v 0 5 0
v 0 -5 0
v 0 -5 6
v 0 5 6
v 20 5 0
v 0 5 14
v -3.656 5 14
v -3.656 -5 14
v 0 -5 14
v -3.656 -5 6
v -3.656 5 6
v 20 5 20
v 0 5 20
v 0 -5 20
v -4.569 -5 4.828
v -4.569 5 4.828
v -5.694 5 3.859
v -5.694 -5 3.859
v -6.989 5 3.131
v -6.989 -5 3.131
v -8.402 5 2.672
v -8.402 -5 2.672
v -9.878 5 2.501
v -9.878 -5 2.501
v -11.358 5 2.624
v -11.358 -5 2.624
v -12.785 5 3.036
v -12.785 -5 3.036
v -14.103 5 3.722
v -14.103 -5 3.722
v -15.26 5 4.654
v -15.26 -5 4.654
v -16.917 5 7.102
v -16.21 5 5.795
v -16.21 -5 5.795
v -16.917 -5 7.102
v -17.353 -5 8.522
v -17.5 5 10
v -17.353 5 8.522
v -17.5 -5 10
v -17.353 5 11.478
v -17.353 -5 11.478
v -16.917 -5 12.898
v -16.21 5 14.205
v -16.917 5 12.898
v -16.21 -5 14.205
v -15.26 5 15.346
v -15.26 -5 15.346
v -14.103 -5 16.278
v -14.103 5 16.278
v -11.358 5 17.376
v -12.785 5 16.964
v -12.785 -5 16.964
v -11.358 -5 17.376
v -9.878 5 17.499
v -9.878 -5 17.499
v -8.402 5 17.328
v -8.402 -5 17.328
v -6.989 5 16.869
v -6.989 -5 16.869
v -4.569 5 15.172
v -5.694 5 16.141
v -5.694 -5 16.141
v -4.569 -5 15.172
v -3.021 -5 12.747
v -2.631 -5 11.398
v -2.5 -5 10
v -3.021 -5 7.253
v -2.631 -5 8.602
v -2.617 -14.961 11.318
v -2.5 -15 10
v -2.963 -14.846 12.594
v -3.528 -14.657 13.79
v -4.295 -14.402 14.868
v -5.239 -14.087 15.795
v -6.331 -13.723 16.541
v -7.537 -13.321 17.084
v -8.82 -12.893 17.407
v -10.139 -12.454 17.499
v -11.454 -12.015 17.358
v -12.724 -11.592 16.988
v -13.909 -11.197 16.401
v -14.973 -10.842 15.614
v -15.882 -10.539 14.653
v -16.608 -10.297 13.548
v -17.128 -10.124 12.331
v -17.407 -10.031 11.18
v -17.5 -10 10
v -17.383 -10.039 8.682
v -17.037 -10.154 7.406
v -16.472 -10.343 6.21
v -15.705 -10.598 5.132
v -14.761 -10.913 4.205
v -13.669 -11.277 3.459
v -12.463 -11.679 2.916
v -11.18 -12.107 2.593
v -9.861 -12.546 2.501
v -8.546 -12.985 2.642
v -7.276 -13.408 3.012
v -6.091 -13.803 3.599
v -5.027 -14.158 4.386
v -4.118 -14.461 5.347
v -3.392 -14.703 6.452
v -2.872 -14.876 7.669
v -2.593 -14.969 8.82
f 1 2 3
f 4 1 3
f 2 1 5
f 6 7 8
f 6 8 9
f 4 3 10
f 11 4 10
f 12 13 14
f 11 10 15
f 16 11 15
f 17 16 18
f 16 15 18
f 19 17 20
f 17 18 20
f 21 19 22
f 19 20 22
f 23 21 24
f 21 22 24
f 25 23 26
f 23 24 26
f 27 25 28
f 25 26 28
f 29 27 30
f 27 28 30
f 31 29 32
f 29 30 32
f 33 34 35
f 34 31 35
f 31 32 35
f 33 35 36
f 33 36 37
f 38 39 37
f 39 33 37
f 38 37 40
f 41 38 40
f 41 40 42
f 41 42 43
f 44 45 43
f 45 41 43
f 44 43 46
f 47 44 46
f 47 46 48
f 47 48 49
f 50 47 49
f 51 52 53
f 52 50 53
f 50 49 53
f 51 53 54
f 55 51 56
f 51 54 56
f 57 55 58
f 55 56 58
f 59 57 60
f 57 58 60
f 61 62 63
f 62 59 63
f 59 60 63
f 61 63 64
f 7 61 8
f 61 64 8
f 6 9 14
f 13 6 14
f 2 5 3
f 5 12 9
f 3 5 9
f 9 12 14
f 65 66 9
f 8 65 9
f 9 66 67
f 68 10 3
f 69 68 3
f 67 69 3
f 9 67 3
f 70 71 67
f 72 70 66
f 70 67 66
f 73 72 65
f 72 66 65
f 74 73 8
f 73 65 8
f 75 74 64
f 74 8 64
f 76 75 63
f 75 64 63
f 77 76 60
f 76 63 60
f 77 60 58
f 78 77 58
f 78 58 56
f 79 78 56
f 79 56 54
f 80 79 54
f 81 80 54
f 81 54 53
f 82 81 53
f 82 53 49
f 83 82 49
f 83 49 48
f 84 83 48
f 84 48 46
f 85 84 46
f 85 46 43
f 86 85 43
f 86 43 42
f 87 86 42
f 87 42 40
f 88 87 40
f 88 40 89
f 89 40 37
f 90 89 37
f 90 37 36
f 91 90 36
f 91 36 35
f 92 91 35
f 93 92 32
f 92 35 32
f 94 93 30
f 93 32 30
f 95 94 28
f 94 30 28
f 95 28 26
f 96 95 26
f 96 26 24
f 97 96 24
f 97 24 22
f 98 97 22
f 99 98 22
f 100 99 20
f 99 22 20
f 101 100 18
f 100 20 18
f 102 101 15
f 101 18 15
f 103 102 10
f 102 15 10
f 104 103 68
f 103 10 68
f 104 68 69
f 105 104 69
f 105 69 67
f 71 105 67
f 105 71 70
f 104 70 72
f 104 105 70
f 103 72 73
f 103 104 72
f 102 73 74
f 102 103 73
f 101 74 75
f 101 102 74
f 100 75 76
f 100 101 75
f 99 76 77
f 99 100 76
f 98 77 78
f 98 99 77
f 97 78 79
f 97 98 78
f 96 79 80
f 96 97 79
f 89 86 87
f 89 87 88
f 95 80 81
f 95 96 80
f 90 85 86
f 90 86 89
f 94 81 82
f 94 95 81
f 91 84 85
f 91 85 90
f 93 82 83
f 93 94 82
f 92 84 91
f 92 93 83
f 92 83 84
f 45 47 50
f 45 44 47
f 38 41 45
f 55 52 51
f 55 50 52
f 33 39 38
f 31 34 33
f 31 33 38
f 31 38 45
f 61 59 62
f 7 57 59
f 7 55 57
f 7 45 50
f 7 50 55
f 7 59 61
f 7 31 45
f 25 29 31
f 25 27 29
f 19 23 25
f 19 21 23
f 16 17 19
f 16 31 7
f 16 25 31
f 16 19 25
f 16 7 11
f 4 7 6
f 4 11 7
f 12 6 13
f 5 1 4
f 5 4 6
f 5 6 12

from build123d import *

# Parameters (mm, degrees)
F0_W      = 40
F0_H      = 10
F1_DEPTH  = 20
F3_DEPTH  = 20.001
F4_R      = 7.5
F5_DEPTH  = 10
F7_DEPTH  = 25
F8_DEPTH  = 20.001
F10_DEPTH = 10.001


with BuildPart() as f1:
    # F0 (on Top) → F1 (new body)
    with BuildSketch(Plane.XY):
        Rectangle(F0_W, F0_H)
    extrude(amount=F1_DEPTH)

    # F2 (on face) → F3 (cut, through all)
    with BuildSketch(Plane.XY.offset(20)):
        Polygon((20, -5), (20, 5), (0, -5), align=None)
    extrude(amount=-F3_DEPTH, mode=Mode.SUBTRACT)

    # F4 (on face) → F5 (join)
    with BuildSketch(Plane.XZ.offset(5)):
        with Locations((-10, 10)):
            Circle(F4_R)
    extrude(amount=F5_DEPTH)

    # F6 (on Top) → F7 (cut)
    with BuildSketch(Plane.XY):
        Polygon((-2.5, -15), (-17.5, -10), (-17.5, -15), align=None)
    extrude(amount=F7_DEPTH, mode=Mode.SUBTRACT)

    # F6 (on Top) → F8 (cut, through all)
    with BuildSketch(Plane.XY):
        Polygon((-2.5, -15), (-17.5, -10), (-17.5, -15), align=None)
    extrude(amount=F8_DEPTH, mode=Mode.SUBTRACT)

    # F9 (on face) → F10 (cut, through all)
    with BuildSketch(Plane.XZ.offset(5)):
        with BuildLine():
            Line((-3.655711, 14), (0, 14))
            Line((0, 14), (0, 20))
            Line((0, 20), (-20, 20))
            Line((-20, 20), (-20, 0))
            Line((-20, 0), (0, 0))
            Line((0, 0), (0, 6))
            Line((0, 6), (-3.655711, 6))
            ThreePointArc((-3.655711, 6), (-17.5, 10), (-3.655711, 14))
        make_face()
    extrude(amount=-F10_DEPTH, mode=Mode.SUBTRACT)


solid = f1.part
